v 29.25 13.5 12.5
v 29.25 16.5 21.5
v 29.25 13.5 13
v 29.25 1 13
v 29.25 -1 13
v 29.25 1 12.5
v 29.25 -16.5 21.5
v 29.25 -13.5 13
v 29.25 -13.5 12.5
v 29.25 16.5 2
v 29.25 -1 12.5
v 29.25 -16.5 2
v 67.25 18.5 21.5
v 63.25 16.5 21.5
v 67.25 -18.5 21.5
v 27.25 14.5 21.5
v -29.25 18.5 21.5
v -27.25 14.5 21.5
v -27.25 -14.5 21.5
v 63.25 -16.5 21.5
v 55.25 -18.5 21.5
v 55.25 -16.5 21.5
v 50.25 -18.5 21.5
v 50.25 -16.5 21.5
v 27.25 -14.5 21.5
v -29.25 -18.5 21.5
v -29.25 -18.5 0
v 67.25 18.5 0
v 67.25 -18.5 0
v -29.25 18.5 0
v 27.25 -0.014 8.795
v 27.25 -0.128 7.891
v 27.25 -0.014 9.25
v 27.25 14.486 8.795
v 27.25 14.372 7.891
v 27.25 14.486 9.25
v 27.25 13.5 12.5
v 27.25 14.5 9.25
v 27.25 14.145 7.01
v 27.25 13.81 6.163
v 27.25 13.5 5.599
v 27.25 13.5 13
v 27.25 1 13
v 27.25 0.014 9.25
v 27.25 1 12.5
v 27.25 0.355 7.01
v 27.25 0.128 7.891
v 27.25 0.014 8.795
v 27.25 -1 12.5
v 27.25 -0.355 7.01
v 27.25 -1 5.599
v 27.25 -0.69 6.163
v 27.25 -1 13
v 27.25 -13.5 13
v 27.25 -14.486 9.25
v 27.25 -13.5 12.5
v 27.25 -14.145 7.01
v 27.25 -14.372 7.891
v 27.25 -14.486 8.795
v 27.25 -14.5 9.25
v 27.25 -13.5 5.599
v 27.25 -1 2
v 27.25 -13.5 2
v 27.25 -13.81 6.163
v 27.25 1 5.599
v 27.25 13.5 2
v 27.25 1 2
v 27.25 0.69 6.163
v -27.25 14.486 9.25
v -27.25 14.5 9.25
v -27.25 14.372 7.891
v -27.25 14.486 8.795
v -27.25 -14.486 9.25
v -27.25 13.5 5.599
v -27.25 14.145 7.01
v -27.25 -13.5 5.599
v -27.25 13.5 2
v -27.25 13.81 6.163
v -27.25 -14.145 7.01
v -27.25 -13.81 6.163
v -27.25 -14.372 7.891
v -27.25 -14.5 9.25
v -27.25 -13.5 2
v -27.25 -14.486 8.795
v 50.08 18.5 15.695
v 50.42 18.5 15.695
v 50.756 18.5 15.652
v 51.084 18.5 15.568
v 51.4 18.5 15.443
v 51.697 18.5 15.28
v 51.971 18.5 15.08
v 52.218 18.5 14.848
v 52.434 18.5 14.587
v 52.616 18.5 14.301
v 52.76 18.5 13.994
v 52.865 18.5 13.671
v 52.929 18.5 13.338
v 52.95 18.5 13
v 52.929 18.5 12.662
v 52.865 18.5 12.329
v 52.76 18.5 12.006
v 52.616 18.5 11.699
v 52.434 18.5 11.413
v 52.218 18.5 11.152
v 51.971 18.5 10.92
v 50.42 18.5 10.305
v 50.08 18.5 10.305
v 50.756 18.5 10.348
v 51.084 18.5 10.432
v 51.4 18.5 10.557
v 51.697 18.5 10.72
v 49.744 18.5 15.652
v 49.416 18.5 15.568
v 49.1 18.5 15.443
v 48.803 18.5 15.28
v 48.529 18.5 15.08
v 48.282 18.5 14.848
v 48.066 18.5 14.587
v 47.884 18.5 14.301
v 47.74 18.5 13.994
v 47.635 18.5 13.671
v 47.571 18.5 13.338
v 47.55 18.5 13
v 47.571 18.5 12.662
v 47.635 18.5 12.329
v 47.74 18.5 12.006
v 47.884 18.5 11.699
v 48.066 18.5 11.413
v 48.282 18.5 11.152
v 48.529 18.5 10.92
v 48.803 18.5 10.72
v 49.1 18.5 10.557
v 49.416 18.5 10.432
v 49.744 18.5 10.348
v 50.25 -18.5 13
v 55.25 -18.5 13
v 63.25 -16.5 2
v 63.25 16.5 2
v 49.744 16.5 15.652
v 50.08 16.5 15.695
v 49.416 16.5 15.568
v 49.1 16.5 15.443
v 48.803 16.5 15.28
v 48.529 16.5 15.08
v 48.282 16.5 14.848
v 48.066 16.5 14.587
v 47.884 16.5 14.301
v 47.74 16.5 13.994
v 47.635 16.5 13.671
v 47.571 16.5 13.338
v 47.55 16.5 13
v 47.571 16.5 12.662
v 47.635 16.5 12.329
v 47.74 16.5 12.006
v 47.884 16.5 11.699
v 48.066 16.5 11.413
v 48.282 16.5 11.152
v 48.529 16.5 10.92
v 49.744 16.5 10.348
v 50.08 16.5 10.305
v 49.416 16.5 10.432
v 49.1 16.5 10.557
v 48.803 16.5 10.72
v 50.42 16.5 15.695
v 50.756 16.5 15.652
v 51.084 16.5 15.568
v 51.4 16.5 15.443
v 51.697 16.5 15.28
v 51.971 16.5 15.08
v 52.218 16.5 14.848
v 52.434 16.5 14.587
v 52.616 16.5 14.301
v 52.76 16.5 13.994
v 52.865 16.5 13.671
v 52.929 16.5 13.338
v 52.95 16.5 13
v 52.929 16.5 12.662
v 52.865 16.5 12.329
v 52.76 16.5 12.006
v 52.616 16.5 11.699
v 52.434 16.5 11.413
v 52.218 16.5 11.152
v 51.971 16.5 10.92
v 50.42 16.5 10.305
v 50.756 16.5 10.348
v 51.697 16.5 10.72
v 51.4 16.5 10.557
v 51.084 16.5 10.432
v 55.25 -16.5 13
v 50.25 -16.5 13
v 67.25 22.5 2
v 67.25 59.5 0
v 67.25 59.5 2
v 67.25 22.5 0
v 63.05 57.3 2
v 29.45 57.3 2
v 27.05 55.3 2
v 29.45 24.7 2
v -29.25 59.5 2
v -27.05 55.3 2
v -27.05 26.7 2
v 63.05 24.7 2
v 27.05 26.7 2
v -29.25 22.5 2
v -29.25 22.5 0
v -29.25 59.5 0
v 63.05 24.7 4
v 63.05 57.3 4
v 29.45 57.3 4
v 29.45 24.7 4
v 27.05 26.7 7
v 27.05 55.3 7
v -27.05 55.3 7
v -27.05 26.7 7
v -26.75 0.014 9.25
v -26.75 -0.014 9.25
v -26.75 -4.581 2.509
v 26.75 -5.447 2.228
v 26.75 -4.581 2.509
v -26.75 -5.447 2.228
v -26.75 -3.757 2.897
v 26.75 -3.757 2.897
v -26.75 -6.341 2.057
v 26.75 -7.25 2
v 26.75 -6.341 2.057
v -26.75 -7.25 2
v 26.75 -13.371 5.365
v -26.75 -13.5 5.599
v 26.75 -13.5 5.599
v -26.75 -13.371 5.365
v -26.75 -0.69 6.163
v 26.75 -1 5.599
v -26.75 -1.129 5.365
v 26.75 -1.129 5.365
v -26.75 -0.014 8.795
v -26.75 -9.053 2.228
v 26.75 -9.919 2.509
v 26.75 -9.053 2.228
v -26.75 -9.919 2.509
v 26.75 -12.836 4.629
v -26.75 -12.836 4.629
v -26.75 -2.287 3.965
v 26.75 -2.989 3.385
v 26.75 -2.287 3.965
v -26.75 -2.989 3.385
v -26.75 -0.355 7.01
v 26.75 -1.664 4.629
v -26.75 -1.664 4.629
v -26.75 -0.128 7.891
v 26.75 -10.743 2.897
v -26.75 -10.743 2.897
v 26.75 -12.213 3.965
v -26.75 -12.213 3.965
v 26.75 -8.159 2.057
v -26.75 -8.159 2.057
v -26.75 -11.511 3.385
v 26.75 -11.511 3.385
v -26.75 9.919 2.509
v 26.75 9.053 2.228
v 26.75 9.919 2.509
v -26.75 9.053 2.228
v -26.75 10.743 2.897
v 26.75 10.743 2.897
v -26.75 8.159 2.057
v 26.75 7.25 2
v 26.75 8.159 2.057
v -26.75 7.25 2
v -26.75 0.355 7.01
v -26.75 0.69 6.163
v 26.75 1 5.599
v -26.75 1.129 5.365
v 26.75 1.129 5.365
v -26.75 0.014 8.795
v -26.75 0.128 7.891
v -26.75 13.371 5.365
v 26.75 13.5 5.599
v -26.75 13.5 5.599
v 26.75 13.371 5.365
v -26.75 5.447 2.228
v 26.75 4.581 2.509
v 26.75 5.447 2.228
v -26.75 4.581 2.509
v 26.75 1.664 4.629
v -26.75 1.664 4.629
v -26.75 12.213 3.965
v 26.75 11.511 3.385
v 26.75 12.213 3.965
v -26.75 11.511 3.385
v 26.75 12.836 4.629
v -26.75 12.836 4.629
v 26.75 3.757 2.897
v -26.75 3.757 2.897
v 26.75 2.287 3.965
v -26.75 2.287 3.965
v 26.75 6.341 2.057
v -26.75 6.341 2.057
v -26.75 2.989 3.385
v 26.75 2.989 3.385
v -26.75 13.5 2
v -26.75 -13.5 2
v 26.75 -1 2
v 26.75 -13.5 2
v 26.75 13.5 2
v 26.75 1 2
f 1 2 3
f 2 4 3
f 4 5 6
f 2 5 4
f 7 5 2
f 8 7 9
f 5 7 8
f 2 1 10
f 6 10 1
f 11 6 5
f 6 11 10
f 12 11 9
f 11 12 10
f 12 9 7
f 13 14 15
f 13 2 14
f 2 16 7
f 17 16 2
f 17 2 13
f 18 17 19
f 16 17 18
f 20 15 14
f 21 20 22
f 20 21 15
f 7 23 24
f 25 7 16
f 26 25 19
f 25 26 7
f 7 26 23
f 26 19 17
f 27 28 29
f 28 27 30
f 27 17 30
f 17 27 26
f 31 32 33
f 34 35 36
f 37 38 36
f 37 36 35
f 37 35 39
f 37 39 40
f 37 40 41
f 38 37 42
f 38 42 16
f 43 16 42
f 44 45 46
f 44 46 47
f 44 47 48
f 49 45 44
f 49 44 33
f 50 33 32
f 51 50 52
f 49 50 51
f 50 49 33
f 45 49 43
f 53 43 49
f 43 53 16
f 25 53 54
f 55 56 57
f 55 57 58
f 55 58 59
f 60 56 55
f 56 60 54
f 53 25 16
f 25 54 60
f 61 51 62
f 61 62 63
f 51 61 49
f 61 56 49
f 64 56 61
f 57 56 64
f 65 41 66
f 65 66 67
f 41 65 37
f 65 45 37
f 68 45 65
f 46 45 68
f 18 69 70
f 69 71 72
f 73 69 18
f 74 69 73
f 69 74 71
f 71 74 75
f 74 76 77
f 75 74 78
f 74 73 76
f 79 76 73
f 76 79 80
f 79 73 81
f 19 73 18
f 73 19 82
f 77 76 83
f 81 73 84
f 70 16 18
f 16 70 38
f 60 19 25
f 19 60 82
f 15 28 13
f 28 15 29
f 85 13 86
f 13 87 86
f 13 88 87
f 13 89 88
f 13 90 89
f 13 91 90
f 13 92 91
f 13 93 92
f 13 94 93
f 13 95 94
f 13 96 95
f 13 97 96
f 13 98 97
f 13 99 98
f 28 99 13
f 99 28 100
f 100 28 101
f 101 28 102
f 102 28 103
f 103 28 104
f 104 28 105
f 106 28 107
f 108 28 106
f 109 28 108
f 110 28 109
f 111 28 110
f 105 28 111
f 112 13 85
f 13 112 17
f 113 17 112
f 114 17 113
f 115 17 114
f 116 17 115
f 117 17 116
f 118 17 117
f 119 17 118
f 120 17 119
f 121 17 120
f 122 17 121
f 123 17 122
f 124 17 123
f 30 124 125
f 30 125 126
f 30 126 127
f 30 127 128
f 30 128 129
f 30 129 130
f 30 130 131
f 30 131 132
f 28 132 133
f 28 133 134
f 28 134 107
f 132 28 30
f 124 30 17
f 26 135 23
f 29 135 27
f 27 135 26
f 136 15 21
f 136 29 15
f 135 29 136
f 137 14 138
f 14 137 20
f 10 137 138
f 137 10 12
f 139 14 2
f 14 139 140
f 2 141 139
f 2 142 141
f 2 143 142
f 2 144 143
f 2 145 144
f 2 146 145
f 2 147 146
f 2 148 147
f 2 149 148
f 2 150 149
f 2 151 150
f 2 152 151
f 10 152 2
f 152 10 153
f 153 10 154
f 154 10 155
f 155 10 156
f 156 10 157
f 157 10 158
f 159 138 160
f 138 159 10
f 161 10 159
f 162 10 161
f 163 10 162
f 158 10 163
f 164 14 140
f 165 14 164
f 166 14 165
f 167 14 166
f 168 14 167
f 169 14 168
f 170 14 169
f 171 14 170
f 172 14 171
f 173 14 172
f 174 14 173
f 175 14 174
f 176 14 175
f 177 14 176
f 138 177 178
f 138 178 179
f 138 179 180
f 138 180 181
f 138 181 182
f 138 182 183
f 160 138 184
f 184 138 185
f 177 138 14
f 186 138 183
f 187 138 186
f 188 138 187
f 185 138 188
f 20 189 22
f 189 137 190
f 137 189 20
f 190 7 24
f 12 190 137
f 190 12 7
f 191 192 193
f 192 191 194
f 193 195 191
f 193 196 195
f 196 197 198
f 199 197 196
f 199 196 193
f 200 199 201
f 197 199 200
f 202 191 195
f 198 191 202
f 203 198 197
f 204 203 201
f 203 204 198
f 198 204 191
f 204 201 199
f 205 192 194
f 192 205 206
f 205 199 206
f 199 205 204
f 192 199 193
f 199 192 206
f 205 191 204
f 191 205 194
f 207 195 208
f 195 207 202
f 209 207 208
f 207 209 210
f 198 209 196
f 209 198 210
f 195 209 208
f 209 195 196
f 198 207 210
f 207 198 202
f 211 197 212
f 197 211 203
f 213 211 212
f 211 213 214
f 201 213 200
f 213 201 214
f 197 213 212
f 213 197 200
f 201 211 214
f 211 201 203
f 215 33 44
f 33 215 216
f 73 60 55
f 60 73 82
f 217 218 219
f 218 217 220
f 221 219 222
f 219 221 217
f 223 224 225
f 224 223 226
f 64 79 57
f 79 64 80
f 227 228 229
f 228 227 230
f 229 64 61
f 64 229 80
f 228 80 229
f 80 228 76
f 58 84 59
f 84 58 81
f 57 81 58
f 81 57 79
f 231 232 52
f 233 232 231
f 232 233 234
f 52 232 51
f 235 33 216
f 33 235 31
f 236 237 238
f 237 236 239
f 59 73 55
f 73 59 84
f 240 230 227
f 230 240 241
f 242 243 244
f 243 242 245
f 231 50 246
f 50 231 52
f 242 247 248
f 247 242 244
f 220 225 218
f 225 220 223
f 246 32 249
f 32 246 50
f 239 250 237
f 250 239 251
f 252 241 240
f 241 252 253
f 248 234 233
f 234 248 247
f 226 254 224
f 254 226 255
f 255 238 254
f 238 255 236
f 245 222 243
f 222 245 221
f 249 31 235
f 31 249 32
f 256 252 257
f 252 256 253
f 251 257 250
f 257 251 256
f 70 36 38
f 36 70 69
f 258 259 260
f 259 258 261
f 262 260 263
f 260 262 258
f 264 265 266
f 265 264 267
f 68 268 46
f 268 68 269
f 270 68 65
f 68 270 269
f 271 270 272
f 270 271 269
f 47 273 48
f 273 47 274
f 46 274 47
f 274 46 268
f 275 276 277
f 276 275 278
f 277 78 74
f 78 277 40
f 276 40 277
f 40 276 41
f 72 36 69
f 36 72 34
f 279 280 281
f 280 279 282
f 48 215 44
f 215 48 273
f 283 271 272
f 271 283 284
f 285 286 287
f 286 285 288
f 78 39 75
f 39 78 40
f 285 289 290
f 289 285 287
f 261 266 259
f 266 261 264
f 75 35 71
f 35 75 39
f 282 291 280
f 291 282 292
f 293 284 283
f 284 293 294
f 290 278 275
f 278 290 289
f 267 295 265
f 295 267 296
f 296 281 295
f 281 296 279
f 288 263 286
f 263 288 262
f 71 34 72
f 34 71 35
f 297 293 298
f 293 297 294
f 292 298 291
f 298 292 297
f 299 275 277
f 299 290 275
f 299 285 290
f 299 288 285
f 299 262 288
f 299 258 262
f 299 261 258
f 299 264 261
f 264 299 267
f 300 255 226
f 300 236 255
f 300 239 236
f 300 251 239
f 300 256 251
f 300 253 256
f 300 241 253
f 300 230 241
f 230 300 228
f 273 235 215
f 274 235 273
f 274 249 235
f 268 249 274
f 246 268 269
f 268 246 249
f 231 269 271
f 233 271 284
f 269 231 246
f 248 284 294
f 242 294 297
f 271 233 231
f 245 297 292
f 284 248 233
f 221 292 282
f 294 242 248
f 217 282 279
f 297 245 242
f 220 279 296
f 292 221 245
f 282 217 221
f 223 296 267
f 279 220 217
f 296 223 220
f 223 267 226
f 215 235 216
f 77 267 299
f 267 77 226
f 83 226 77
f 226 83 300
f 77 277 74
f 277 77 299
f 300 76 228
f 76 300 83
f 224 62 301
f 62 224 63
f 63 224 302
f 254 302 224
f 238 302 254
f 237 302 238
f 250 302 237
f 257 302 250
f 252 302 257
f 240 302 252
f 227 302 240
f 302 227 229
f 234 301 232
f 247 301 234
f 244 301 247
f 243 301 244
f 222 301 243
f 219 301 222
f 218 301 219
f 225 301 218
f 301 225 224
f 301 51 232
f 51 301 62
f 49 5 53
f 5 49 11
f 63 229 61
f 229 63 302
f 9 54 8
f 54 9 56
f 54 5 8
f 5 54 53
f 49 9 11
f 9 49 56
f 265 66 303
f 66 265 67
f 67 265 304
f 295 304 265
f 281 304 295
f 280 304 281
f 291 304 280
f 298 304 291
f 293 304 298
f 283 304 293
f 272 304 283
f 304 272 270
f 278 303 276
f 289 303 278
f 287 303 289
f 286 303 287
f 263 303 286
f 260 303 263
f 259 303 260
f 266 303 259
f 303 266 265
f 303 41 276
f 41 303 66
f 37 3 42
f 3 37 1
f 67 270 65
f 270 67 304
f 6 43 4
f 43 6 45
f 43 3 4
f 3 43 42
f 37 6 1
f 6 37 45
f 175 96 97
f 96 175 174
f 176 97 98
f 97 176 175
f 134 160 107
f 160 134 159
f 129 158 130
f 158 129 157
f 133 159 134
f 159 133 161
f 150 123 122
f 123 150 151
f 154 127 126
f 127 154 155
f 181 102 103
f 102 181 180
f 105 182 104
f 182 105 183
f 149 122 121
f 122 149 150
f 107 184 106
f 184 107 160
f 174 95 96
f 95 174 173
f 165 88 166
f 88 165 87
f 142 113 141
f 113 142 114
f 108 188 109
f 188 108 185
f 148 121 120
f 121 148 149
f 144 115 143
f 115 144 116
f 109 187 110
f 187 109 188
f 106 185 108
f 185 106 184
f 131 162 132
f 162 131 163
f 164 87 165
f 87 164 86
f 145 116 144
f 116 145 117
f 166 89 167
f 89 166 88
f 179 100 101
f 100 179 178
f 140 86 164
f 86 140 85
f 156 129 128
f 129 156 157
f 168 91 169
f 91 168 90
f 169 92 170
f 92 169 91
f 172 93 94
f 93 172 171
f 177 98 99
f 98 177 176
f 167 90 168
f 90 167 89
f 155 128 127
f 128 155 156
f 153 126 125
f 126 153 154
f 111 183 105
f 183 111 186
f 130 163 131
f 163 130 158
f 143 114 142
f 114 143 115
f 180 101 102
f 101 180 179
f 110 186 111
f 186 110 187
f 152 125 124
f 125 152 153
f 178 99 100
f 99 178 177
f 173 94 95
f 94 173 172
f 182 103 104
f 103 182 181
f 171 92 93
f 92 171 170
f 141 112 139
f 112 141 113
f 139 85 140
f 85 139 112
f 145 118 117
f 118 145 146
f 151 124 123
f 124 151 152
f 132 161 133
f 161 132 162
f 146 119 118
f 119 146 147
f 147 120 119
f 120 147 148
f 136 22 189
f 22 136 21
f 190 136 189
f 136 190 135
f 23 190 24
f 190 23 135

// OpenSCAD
/*
A Battery Compartment generator
enter the battery-type and the number of batteries you need and 
export the stl file. Print on a 3D-Printer and add some metall pieces into the slits
on the side
*/

AA = [ 14.5, 50.5 ];
AAA = [ 10.5,44.5 ];
C = [ 26.2, 50 ];
D = [ 34.2, 61.5 ]; 

// CHOOSE BATTERY TYPE AND COUNT 
typ = AA;
num =2;


translate( v = [-typ[1]/2 -4,-typ[0]*num/2 -2,0] ) {

difference() {
difference() {
union() {
difference() {
   cube( size = [ typ[1] + 8, typ[0] * num + 4, typ[0] + 2 + 5] );
   translate( v = [2,2,2] ) {
   	cube( size = [typ[1] +4, typ[0] * num, typ[0] + 1 + 5 ]);
   }
}

translate( v = [typ[1] + 8, -2, 0 ] ) {
   difference() {
     cube( size = [ 38, typ[0] * num + 8, typ[0] + 2 + 5] );
     translate( v = [0,2,2] ) {
       cube( size = [ 38 - 4, typ[0] * num + 4, typ[0] + 2 + 5] );
     }
  }
}



// cover
translate( v = [0, typ[0] * num + 10, 0 ] ) {
    union() {
      cube( size = [ typ[1] + 8 + 38, typ[0] * num + 8, 2] );
      translate( v = [typ[1] + 8.2, 2.2, 2] ) {
        cube( size = [ 38 - 4 - 0.4, typ[0] * num + 4 - 0.4, 2] );
      }
      translate( v = [2 + 0.2, 4 + 0.2, 2] ) {
        cube( size = [ typ[1] +4 - 0.4, typ[0] * num - 0.4, 5] );
      }
      
    }
}

translate( v = [0, -2, 0] ) {
  cube( size = [ typ[1] + 8, 2, typ[0] + 2 + 5] );
}
translate( v = [0, typ[0] * num + 4, 0] ) {
  cube( size = [ typ[1] + 8, 2, typ[0] + 2 + 5] );
}


translate( v= [2,2,2] ) {
for( i = [0:num-1] ) {
	translate( v = [0, typ[0] * i, 0] ) {
		difference() {
			cube( size = [typ[1]+4, typ[0], typ[0]/2] );
			translate( v = [ 0, typ[0]/2, typ[0]/2 ] ) {
				rotate( v = [0,1,0], a = 90 ) {
					cylinder( h = typ[1]+4, r = typ[0]/2, $fn=50 );
				}
			}
		}
	}
}
}
}

union() {
if ( num % 2 == 0 ) {
	for( i = [0:2:num-2] ) {
		translate( v = [2, typ[0] * i+3,2 ] ) {
			cube( size = [0.5, typ[0] * 2 - 2 , typ[0]]  );
		}	
	}
	if ( num  > 2 ) {
		for( i = [1:2:num-3] ) {
			translate( v = [5.5 + typ[1], typ[0] * i+3,2 ] ) {
				cube( size = [0.5, typ[0] * 2 - 2 , typ[0]]  );
			}	
		}
	}
	translate( v = [5.5+typ[1], 3, 2] ) {
		cube( size = [0.5, typ[0]-2, typ[0]]);
	}

	translate( v = [5.5+typ[1], 3, typ[0] - 2]) {
		cube( size = [3, typ[0]-2, 0.5] );
	}

	translate( v = [5.5+typ[1], 3+typ[0] * (num-1), 2] ) {
		cube( size = [0.5, typ[0]-2, typ[0]]);
	}

	translate( v = [5.5+typ[1], 3+typ[0] * (num-1), typ[0] - 2]) {
		cube( size = [3, typ[0]-2, 0.5] );
	}

	
} else {
	if ( num  > 1 ) {
		for( i = [0:2:num-2] ) {
			translate( v = [2, typ[0] * i+3,2 ] ) {
				cube( size = [0.5, typ[0] * 2 - 2 , typ[0]]  );
			}	
		}
		for( i = [1:2:num-2] ) {
			translate( v = [5.5 + typ[1], typ[0] * i+3,2 ] ) {
				cube( size = [0.5, typ[0] * 2 - 2 , typ[0]]  );
			}	
		}
	}
	translate( v = [5.5+typ[1], 3, 2] ) {
		cube( size = [0.5, typ[0]-2, typ[0]]);
	}
	translate( v = [5.5+typ[1], 3, typ[0] - 2]) {
		cube( size = [3, typ[0]-2, 0.5] );
	}

	translate( v = [2, 3+typ[0] * (num-1), 2] ) {
		cube( size = [0.5, typ[0]-2, typ[0]]);
	}
	translate( v = [-0.5, 3+typ[0] * (num-1), typ[0] - 2]) {
		cube( size = [3, typ[0]-2, 0.5] );
	}

} 
}
}

union() {
  translate( v = [typ[1] + 10 + (38 / 2), 46, 13] ) {
    rotate( v = [1,0,0], a = 90 ) {
    	cylinder(30, r = 2.7, $fn=50 );
    }
  }
  translate( v = [typ[1] + 10 + (38 / 2), -4, 13] ) {
    cube( size = [5, 5, 10]  );
  }
  
}

}
}
